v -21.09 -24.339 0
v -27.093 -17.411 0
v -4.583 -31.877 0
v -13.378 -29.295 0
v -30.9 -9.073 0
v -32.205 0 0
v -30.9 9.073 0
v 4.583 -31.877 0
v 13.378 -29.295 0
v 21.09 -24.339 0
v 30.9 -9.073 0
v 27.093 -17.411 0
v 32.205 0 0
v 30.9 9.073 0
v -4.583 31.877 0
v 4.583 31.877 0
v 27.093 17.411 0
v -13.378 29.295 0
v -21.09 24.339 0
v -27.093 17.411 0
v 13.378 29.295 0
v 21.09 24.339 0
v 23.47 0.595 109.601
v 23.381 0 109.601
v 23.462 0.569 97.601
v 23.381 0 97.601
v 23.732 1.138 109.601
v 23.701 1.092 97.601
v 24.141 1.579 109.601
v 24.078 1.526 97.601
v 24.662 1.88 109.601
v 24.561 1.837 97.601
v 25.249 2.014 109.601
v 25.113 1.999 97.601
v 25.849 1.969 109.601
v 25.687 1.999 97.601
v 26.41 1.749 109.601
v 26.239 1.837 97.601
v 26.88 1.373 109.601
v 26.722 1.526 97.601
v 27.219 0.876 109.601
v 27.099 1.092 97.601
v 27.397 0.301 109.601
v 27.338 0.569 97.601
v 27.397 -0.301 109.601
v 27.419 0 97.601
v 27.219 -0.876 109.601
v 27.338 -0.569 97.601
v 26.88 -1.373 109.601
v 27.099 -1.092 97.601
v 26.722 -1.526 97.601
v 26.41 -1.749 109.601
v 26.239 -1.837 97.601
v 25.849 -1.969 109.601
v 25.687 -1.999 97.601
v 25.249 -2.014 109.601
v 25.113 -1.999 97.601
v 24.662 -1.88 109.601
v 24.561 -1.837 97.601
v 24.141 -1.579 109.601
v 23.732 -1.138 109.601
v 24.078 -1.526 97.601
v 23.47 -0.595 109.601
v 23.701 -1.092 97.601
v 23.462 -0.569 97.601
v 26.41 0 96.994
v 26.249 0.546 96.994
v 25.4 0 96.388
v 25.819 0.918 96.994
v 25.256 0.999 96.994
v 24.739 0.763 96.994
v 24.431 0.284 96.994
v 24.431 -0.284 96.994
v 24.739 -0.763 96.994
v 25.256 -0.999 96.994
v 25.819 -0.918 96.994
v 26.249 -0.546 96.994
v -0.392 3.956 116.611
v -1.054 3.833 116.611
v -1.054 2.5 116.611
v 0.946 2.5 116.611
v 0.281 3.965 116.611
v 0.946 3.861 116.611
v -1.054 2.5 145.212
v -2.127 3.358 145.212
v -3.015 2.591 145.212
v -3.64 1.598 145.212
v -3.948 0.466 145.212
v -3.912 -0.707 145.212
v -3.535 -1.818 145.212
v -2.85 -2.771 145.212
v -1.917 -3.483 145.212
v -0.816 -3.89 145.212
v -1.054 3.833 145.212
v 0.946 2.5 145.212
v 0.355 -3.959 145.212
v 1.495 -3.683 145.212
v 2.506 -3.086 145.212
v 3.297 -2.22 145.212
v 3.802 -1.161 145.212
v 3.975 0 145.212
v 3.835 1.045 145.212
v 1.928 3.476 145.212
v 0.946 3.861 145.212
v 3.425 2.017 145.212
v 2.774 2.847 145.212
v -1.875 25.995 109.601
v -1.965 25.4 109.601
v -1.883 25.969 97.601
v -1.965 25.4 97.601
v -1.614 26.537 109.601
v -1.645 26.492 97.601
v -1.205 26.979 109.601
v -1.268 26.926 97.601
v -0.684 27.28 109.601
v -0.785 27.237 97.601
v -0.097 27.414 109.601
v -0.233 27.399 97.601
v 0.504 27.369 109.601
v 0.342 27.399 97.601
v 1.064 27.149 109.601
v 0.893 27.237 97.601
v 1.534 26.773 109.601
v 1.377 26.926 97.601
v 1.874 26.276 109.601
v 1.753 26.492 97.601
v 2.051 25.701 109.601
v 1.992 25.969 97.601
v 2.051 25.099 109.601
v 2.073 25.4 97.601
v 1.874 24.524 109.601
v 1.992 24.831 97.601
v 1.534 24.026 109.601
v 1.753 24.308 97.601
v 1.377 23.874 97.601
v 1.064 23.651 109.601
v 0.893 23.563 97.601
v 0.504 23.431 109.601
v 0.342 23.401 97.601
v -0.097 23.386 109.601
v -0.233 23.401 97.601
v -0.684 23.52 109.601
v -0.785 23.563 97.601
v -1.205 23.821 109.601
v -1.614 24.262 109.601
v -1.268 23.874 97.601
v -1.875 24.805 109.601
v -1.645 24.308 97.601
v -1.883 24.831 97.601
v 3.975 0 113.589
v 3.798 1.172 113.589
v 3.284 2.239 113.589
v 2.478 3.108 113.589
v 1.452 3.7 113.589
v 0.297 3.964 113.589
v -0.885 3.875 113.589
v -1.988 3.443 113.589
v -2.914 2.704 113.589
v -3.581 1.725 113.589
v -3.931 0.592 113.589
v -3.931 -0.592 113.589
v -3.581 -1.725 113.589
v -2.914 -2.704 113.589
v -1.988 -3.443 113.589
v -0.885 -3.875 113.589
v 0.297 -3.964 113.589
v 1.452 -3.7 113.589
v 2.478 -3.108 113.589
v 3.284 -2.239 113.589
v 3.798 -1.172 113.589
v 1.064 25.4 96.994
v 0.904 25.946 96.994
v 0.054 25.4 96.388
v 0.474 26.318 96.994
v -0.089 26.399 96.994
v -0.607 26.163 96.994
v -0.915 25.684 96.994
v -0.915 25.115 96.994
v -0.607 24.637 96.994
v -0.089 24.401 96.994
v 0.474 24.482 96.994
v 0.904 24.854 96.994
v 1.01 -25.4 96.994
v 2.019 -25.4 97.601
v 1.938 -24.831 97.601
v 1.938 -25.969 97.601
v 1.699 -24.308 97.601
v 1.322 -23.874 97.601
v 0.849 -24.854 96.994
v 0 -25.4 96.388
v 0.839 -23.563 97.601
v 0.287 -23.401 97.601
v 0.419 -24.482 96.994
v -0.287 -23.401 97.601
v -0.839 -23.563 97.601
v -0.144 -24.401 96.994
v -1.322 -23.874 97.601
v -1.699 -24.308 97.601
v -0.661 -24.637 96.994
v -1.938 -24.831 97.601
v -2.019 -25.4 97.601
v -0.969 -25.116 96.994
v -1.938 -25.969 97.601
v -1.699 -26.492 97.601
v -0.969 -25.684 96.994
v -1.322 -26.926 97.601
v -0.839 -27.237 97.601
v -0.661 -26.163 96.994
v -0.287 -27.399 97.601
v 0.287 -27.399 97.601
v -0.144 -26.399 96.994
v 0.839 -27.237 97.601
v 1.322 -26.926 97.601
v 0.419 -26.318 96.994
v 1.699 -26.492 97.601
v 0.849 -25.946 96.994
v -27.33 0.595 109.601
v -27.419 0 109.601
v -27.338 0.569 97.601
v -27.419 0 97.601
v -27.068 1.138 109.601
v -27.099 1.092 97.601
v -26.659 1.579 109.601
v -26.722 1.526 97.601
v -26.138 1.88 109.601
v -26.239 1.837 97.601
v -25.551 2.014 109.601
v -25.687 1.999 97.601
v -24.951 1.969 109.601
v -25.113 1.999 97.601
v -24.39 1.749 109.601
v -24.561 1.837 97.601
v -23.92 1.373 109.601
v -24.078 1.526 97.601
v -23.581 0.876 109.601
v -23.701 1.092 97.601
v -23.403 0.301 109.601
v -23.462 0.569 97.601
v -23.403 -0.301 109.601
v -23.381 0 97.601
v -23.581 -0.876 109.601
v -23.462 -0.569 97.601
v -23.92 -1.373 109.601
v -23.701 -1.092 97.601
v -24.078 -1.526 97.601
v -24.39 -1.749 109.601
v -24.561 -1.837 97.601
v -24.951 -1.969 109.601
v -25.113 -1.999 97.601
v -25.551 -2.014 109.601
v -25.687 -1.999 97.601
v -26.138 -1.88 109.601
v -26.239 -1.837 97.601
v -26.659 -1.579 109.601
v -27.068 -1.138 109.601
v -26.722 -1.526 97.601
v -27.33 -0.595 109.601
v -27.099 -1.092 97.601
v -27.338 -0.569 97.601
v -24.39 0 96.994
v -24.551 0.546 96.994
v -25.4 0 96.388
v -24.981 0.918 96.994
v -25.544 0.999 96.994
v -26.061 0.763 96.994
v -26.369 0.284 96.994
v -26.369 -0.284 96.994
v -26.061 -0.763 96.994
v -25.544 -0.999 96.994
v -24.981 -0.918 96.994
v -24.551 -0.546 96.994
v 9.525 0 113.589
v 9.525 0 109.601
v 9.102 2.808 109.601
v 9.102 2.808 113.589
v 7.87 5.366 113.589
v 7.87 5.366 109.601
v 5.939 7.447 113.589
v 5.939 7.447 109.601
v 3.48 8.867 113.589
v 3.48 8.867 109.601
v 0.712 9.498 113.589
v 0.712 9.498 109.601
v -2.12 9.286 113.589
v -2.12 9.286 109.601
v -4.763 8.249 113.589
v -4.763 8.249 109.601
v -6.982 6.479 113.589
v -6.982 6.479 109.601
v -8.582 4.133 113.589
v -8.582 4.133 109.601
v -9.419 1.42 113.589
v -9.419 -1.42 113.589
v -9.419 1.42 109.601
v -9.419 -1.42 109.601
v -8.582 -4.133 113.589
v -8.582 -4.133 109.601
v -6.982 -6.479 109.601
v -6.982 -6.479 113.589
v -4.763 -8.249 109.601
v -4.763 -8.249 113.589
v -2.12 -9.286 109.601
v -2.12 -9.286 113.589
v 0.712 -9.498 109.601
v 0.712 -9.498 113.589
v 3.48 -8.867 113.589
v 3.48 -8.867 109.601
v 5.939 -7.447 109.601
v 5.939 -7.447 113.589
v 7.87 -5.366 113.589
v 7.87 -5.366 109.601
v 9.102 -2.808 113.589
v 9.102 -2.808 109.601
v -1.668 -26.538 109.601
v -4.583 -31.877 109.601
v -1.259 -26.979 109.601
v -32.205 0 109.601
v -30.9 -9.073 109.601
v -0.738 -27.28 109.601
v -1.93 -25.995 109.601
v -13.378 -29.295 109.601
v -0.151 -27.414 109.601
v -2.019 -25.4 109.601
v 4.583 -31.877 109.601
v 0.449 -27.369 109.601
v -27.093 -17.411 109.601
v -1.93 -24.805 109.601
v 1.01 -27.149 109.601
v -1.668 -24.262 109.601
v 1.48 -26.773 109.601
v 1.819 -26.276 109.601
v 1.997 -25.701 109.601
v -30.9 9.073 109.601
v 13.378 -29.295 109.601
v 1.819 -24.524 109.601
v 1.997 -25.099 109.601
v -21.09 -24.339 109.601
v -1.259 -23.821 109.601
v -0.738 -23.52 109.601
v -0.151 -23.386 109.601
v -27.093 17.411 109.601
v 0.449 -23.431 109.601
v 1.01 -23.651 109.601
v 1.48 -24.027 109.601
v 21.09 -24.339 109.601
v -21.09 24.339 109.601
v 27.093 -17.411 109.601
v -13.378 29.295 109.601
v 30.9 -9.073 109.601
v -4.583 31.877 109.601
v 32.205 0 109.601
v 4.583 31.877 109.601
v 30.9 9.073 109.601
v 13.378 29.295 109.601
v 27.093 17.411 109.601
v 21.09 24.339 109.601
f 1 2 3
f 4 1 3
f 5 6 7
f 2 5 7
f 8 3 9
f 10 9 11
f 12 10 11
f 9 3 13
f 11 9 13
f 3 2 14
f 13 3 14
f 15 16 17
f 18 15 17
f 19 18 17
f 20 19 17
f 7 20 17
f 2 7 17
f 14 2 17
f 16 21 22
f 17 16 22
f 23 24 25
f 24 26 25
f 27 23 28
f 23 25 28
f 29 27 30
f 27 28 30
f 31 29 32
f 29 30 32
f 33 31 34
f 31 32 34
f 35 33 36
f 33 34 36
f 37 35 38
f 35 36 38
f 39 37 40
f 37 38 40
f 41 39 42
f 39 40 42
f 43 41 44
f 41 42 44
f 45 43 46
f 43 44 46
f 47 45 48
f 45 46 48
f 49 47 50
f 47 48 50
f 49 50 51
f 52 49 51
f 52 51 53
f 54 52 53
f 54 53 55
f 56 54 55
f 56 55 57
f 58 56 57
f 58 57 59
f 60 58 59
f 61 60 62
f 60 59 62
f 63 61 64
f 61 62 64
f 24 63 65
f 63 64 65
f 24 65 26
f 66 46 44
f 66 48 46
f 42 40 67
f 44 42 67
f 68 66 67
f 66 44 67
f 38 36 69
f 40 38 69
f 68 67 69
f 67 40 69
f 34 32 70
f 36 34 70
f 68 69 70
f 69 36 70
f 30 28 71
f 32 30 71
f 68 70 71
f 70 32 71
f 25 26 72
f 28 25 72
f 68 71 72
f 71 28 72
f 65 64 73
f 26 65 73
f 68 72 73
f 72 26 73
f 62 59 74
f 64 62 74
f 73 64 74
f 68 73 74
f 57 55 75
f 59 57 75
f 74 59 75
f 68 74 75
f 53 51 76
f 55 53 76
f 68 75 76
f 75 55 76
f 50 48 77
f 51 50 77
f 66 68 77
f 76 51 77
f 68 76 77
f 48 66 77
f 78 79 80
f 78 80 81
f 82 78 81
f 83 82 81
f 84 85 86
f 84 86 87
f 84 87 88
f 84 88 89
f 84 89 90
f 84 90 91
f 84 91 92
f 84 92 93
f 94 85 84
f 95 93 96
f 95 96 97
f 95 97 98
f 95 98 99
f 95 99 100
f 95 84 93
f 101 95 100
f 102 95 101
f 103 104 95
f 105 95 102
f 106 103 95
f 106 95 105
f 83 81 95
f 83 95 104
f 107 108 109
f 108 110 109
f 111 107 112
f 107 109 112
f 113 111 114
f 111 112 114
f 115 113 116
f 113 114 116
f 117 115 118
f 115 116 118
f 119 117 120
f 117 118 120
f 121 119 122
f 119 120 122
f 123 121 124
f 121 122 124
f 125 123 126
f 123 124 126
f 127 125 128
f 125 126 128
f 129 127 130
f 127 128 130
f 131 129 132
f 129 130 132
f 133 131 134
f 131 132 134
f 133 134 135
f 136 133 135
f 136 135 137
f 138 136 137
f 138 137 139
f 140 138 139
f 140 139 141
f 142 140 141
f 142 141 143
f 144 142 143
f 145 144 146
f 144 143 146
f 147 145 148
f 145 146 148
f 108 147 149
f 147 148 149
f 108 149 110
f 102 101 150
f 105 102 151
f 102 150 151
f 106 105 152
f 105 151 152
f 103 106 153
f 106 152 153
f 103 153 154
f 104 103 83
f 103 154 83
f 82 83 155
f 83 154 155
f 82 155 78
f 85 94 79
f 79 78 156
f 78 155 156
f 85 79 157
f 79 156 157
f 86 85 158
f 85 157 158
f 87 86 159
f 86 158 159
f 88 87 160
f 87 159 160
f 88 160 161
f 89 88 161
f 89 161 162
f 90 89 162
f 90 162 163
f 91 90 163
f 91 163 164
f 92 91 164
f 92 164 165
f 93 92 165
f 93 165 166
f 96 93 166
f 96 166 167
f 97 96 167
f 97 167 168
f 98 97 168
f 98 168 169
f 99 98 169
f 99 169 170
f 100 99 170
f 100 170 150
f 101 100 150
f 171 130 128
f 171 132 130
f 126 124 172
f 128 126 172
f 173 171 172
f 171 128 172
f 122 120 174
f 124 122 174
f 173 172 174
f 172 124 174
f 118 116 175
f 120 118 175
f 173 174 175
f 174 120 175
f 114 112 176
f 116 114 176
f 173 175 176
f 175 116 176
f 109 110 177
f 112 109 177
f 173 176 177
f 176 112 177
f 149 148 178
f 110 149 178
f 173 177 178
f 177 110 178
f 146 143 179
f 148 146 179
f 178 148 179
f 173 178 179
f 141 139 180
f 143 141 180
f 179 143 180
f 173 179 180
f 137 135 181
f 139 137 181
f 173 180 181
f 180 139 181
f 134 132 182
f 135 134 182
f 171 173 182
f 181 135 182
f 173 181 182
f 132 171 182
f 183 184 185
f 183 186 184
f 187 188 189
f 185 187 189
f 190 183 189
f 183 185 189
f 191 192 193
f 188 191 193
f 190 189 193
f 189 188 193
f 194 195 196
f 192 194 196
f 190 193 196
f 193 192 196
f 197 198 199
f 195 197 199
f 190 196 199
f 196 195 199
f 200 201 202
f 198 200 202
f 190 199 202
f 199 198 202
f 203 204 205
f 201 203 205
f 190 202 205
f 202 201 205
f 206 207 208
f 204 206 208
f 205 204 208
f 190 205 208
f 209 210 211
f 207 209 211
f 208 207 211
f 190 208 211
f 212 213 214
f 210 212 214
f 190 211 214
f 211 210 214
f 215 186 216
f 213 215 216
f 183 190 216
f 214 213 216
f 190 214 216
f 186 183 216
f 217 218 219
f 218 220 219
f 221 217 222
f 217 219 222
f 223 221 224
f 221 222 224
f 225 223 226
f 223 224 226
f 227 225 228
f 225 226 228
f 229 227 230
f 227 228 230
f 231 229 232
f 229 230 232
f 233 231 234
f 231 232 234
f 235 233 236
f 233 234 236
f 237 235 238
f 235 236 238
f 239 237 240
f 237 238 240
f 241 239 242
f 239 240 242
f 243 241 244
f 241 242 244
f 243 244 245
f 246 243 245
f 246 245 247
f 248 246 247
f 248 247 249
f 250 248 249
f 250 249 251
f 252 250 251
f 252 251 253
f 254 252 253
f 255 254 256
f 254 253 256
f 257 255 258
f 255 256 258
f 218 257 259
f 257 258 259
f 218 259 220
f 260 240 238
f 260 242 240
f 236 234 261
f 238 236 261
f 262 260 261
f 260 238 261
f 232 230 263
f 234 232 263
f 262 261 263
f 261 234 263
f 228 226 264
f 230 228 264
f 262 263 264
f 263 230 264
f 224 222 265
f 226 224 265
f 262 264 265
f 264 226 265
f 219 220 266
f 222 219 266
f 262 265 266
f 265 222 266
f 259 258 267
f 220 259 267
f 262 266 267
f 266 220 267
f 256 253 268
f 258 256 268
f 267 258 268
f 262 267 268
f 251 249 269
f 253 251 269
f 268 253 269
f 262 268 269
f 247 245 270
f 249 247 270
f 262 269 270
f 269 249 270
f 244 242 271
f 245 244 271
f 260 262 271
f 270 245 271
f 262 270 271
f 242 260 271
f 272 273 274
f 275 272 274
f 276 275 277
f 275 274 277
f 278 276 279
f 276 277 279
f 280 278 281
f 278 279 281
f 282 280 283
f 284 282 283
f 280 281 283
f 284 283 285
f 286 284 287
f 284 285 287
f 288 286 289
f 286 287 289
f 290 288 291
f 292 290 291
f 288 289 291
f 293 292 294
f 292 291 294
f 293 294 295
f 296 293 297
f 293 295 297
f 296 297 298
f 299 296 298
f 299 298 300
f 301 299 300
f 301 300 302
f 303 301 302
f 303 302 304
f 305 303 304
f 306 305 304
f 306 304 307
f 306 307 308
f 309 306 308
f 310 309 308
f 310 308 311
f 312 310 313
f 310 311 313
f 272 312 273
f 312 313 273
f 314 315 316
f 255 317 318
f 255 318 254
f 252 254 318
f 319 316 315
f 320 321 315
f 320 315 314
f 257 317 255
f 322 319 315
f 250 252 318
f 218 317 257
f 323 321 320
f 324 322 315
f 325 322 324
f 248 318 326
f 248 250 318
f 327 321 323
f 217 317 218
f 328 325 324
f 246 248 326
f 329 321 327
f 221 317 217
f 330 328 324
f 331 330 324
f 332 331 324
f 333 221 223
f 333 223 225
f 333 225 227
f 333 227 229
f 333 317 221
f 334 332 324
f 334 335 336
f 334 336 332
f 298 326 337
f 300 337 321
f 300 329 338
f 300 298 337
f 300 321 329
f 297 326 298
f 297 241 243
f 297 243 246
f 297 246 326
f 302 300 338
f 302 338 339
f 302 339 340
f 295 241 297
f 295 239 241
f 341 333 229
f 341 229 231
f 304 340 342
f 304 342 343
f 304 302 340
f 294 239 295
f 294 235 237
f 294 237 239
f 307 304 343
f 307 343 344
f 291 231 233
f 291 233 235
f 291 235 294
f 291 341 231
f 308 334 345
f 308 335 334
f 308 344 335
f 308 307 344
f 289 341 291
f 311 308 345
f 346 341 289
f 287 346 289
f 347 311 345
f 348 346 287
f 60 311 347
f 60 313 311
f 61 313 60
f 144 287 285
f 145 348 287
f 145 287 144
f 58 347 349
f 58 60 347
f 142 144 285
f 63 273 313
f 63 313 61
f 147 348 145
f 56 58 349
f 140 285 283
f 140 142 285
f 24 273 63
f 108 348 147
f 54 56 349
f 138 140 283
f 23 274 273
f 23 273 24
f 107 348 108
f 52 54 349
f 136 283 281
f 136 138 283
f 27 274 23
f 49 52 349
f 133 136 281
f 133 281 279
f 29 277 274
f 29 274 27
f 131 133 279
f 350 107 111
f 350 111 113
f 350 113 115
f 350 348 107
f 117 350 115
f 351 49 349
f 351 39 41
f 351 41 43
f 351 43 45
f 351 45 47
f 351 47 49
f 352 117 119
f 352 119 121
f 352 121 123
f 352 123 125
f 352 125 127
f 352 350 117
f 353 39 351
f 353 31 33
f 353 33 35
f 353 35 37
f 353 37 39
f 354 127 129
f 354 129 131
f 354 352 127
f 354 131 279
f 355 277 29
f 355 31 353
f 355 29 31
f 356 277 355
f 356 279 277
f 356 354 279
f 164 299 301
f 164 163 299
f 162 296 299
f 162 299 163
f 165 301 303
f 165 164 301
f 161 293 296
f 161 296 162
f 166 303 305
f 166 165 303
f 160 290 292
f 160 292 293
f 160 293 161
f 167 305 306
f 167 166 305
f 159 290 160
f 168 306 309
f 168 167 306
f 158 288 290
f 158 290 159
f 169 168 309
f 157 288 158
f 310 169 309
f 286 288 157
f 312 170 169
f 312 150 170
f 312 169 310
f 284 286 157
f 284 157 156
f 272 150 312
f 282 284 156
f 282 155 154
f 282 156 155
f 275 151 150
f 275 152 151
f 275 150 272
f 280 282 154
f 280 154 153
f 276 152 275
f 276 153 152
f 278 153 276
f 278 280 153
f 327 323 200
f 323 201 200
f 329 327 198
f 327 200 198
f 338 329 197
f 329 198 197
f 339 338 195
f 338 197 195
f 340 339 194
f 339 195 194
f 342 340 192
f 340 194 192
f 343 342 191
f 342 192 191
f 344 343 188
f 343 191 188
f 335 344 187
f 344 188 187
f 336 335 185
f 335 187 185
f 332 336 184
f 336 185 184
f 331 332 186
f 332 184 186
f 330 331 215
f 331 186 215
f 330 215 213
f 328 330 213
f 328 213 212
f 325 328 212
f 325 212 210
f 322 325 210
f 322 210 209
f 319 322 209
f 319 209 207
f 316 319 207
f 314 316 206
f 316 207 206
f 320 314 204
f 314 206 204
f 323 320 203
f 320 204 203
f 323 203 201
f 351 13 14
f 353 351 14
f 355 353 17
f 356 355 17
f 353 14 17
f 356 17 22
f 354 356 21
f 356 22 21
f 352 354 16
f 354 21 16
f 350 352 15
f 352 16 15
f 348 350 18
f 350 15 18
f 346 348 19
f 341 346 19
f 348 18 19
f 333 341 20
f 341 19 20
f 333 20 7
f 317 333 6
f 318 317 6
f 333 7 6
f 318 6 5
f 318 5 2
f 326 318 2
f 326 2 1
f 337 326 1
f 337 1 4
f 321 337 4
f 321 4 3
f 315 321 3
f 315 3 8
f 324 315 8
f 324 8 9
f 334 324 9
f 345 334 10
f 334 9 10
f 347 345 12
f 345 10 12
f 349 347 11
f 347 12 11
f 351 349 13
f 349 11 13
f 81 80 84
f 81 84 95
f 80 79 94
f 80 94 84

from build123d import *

# Parameters (mm, degrees)
F0_R     = 32.205
F1_DEPTH = 109.601
F2_R     = 9.525
F3_DEPTH = 3.9878
F4_R     = 3.9751
F5_DEPTH = 31.623
F7_DEPTH = 28.6004
F9_D     = 4.0386
F9_DEPTH = 12
F9_TIP   = 1.213317848


with BuildPart() as f1:
    # F0 (on Top) → F1 (new body)
    with BuildSketch(Plane.XY):
        Circle(F0_R)
    extrude(amount=F1_DEPTH)

    # F2 (on face) → F3 (join)
    with BuildSketch(Plane.XY.offset(109.601)):
        Circle(F2_R)
    extrude(amount=F3_DEPTH)

    # F4 (on face) → F5 (join)
    with BuildSketch(Plane.XY.offset(113.5888)):
        Circle(F4_R)
    extrude(amount=F5_DEPTH)

    # F6 (on face) → F7 (cut)
    with BuildSketch(Plane.XY.offset(145.2118)):
        with BuildLine():
            Line((0.9462931883, 2.5), (0.9462931883, 3.8608223492))
            ThreePointArc((0.9462931883, 3.8608223492), (-0.0554917727, 3.9747126529), (-1.0537068117, 3.8328999419))
            Line((-1.0537068117, 3.8328999419), (-1.0537068117, 2.5))
            Line((-1.0537068117, 2.5), (0.9462931883, 2.5))
        make_face()
    extrude(amount=-F7_DEPTH, mode=Mode.SUBTRACT)

    # F9
    with Locations(Plane.XY.offset(109.601)):
        with Locations((0.0541911848, 25.3999421912), (25.4, 0), (-25.4, 0), (0, -25.4)):
            Hole(F9_D / 2, depth=F9_DEPTH)
            with Locations((0, 0, -(F9_DEPTH + F9_TIP / 2))):  # 118° drill point
                Cone(0, F9_D / 2, F9_TIP, mode=Mode.SUBTRACT)


solid = f1.part
